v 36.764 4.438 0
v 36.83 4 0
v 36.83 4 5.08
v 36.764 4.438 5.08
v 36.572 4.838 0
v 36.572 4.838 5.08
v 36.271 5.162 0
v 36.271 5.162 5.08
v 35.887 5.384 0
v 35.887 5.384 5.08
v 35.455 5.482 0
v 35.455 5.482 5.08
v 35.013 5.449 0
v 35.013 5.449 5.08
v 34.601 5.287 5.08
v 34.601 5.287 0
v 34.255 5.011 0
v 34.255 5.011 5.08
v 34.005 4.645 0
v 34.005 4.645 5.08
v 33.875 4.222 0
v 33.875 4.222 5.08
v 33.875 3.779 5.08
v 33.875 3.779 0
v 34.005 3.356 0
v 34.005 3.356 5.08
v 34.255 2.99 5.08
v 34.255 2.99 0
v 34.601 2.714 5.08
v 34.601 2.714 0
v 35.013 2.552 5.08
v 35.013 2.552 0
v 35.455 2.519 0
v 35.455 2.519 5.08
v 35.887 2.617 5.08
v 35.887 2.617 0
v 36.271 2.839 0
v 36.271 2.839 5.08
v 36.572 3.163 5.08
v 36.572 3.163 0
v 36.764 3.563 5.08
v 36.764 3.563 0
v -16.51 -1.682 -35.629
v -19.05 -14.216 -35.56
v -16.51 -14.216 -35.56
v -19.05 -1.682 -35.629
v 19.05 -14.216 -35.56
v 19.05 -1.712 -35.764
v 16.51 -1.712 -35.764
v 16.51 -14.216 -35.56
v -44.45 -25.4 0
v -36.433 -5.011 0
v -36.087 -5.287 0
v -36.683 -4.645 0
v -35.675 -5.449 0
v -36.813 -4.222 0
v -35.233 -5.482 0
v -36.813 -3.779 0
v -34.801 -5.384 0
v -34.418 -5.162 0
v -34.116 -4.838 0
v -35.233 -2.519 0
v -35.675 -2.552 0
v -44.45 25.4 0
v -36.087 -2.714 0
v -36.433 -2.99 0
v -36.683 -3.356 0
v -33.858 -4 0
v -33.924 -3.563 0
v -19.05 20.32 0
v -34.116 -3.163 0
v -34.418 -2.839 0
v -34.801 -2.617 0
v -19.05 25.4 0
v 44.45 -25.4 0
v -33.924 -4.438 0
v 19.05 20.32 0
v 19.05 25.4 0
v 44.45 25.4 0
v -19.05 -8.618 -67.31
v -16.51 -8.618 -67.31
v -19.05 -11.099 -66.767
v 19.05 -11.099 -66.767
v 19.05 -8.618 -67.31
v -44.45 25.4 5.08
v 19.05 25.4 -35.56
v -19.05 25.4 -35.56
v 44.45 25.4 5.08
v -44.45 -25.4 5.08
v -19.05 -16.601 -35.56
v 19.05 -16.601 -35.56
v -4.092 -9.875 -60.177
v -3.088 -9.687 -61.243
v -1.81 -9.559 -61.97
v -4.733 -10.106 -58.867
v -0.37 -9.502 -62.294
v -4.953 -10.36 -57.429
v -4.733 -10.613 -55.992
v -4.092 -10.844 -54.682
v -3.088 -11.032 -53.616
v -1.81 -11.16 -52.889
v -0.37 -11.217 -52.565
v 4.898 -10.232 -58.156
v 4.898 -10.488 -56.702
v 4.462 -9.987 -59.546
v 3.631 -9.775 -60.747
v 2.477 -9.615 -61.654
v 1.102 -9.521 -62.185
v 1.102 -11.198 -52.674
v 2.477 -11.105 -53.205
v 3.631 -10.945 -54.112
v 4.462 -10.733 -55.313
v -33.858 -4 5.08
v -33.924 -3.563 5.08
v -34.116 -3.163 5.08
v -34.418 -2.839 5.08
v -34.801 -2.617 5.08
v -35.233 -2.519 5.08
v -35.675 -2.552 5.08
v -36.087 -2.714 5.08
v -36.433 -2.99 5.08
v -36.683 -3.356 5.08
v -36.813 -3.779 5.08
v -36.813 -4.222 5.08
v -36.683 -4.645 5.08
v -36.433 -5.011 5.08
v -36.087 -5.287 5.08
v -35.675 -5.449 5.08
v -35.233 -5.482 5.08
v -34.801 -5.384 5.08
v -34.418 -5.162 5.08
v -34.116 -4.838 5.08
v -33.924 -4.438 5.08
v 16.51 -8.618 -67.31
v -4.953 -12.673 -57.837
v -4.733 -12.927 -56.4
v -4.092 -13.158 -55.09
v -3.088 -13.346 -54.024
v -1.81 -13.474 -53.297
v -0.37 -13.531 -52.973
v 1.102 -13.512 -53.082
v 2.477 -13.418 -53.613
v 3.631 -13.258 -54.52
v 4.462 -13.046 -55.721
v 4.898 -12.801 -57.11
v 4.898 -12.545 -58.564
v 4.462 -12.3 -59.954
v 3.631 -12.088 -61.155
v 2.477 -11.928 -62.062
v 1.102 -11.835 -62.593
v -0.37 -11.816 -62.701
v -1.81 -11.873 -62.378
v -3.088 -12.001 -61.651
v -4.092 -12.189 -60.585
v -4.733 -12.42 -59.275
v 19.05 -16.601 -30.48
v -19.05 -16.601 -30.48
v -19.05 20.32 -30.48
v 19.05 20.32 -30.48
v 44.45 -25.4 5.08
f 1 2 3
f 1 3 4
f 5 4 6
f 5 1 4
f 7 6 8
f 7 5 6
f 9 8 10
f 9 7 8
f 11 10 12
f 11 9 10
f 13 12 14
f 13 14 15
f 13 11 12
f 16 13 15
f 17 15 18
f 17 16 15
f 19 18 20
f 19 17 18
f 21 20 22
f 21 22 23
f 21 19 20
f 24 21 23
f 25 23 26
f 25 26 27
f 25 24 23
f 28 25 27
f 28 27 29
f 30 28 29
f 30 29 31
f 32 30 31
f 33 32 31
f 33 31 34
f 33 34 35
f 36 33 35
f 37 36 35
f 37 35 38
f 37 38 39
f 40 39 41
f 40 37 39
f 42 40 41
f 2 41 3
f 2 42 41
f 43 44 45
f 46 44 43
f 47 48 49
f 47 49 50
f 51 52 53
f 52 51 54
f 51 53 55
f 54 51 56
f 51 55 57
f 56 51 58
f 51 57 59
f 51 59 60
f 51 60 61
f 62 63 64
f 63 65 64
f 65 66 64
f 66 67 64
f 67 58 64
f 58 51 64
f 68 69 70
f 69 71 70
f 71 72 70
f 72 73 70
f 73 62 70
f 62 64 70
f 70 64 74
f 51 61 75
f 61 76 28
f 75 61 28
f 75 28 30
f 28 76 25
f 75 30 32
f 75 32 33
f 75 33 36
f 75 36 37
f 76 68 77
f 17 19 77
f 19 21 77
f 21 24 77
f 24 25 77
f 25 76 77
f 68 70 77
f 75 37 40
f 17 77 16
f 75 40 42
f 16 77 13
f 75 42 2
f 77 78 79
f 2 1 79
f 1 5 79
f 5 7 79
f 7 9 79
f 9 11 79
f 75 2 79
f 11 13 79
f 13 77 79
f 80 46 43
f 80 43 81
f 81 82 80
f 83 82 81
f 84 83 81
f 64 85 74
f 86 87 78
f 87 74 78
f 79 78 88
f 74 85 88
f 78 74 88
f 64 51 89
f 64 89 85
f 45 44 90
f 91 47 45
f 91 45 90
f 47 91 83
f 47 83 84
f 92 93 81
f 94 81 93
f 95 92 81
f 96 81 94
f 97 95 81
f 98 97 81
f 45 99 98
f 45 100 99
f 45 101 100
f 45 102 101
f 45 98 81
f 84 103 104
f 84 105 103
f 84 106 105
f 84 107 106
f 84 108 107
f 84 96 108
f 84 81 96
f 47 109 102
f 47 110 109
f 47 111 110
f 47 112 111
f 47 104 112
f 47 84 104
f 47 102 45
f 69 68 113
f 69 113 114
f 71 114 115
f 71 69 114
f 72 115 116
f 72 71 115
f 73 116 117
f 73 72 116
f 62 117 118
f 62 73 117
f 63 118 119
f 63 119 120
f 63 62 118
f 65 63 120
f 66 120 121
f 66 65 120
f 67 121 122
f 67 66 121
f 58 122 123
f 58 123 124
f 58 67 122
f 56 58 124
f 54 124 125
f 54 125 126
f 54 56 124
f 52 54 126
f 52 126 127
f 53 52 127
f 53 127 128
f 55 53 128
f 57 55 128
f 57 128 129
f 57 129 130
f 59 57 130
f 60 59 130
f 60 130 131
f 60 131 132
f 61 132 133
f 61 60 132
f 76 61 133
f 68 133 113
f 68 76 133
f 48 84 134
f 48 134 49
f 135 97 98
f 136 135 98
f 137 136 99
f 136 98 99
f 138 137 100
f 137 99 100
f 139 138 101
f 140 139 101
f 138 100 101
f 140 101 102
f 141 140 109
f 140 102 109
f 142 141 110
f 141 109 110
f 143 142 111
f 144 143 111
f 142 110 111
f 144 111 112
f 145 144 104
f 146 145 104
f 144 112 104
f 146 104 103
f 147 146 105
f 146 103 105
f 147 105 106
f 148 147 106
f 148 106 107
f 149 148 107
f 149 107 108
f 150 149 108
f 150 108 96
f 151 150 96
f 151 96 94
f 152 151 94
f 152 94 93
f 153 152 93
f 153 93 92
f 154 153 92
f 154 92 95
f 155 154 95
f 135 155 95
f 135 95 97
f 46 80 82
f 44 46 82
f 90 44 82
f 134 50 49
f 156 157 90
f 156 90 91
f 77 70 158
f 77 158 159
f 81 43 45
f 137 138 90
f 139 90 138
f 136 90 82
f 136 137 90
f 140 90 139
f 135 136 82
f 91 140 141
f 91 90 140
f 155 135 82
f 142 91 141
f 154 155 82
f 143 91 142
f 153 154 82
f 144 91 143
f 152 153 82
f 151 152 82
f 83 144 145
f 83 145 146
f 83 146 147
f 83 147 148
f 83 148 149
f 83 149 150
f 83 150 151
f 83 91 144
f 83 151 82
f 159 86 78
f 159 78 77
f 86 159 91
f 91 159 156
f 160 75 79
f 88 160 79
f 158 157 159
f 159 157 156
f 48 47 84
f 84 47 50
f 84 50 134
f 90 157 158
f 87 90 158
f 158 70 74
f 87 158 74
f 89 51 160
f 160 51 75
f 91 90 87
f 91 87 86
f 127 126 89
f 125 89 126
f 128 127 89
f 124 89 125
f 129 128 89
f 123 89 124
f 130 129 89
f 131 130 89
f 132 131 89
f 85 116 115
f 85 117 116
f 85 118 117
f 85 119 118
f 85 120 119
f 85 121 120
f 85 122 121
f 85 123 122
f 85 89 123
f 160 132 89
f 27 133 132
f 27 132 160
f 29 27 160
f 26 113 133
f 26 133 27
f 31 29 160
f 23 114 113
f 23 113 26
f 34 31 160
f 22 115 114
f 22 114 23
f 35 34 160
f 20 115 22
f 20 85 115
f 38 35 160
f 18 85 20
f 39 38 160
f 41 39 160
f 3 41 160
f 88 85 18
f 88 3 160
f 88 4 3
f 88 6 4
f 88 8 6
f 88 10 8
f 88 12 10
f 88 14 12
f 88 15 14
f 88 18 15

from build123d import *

# Parameters (mm, degrees)
F1_W      = 88.9
F1_H      = 50.8
F1_R      = 1.4859
F2_DEPTH  = 5.08
F3_W      = 38.1
F3_H      = 5.08
F4_DEPTH  = 30.48
F5_W      = 38.1
F5_H      = 36.9214013798
F5_H_2    = 5.08
F6_DEPTH  = 5.08
F8_DEPTH  = 38.1
F10_D     = 9.906
F12_DEPTH = 2.54
F14_DEPTH = 2.54


with BuildPart() as f2:
    # F1 (on Top) → F2 (new body)
    with BuildSketch(Plane.XY):
        Rectangle(F1_W, F1_H)
        with Locations((-35.3441, -4.0005)):
            Circle(F1_R, mode=Mode.SUBTRACT)
        with Locations((35.3441, 4.0005)):
            Circle(F1_R, mode=Mode.SUBTRACT)
    extrude(amount=F2_DEPTH)

    # F3 (on face) → F4 (join)
    with BuildSketch(Plane(origin=(0, 0, 0), x_dir=(1, 0, 0), z_dir=(0, 0, -1))):
        with Locations((0, -22.86)):
            Rectangle(F3_W, F3_H)
    extrude(amount=F4_DEPTH)

    # F5 (on face) → F6 (join)
    with BuildSketch(Plane(origin=(0, 0, -30.48), x_dir=(1, 0, 0), z_dir=(0, 0, -1))):
        with Locations((0, -1.8592993101)):
            Rectangle(F5_W, F5_H)
        with Locations((0, -22.86)):
            Rectangle(F5_W, F5_H_2)
    extrude(amount=F6_DEPTH)


with BuildPart() as f8:
    # F7 (on face) → F8 (new body)
    with BuildSketch(Plane.YZ.offset(19.05)):
        Polygon((-14.2159419584, -35.56), (-16.6014013798, -35.56), (-11.0987988182, -66.7668098681), (-8.6175603209, -67.31), align=None)
    extrude(amount=-F8_DEPTH)

    # F10 (through all)
    with Locations(Plane(origin=(0, -22.1819260239, -3.9112720421), x_dir=(1, 0, 0), z_dir=(0, -0.984807753, -0.1736481777))):
        with Locations((0, -54.7579862096)):
            Hole(F10_D / 2)

    # F13 (on face) → F14 (join)
    with BuildSketch(Plane(origin=(-19.05, 0, 0), x_dir=(0, -1, 0), z_dir=(-1, 0, 0))):
        Polygon((1.6820278631, -35.629177536), (8.6175603209, -67.31), (14.2159419584, -35.56), align=None)
    extrude(amount=-F14_DEPTH)


with BuildPart() as f12:
    # F11 (on face) → F12 (new body)
    with BuildSketch(Plane.YZ.offset(19.05)):
        Polygon((-14.2159419584, -35.56), (-8.6175603209, -67.31), (-1.7115654359, -35.7641022312), align=None)
    extrude(amount=-F12_DEPTH)


solid = Compound([f2.part, f8.part, f12.part])
